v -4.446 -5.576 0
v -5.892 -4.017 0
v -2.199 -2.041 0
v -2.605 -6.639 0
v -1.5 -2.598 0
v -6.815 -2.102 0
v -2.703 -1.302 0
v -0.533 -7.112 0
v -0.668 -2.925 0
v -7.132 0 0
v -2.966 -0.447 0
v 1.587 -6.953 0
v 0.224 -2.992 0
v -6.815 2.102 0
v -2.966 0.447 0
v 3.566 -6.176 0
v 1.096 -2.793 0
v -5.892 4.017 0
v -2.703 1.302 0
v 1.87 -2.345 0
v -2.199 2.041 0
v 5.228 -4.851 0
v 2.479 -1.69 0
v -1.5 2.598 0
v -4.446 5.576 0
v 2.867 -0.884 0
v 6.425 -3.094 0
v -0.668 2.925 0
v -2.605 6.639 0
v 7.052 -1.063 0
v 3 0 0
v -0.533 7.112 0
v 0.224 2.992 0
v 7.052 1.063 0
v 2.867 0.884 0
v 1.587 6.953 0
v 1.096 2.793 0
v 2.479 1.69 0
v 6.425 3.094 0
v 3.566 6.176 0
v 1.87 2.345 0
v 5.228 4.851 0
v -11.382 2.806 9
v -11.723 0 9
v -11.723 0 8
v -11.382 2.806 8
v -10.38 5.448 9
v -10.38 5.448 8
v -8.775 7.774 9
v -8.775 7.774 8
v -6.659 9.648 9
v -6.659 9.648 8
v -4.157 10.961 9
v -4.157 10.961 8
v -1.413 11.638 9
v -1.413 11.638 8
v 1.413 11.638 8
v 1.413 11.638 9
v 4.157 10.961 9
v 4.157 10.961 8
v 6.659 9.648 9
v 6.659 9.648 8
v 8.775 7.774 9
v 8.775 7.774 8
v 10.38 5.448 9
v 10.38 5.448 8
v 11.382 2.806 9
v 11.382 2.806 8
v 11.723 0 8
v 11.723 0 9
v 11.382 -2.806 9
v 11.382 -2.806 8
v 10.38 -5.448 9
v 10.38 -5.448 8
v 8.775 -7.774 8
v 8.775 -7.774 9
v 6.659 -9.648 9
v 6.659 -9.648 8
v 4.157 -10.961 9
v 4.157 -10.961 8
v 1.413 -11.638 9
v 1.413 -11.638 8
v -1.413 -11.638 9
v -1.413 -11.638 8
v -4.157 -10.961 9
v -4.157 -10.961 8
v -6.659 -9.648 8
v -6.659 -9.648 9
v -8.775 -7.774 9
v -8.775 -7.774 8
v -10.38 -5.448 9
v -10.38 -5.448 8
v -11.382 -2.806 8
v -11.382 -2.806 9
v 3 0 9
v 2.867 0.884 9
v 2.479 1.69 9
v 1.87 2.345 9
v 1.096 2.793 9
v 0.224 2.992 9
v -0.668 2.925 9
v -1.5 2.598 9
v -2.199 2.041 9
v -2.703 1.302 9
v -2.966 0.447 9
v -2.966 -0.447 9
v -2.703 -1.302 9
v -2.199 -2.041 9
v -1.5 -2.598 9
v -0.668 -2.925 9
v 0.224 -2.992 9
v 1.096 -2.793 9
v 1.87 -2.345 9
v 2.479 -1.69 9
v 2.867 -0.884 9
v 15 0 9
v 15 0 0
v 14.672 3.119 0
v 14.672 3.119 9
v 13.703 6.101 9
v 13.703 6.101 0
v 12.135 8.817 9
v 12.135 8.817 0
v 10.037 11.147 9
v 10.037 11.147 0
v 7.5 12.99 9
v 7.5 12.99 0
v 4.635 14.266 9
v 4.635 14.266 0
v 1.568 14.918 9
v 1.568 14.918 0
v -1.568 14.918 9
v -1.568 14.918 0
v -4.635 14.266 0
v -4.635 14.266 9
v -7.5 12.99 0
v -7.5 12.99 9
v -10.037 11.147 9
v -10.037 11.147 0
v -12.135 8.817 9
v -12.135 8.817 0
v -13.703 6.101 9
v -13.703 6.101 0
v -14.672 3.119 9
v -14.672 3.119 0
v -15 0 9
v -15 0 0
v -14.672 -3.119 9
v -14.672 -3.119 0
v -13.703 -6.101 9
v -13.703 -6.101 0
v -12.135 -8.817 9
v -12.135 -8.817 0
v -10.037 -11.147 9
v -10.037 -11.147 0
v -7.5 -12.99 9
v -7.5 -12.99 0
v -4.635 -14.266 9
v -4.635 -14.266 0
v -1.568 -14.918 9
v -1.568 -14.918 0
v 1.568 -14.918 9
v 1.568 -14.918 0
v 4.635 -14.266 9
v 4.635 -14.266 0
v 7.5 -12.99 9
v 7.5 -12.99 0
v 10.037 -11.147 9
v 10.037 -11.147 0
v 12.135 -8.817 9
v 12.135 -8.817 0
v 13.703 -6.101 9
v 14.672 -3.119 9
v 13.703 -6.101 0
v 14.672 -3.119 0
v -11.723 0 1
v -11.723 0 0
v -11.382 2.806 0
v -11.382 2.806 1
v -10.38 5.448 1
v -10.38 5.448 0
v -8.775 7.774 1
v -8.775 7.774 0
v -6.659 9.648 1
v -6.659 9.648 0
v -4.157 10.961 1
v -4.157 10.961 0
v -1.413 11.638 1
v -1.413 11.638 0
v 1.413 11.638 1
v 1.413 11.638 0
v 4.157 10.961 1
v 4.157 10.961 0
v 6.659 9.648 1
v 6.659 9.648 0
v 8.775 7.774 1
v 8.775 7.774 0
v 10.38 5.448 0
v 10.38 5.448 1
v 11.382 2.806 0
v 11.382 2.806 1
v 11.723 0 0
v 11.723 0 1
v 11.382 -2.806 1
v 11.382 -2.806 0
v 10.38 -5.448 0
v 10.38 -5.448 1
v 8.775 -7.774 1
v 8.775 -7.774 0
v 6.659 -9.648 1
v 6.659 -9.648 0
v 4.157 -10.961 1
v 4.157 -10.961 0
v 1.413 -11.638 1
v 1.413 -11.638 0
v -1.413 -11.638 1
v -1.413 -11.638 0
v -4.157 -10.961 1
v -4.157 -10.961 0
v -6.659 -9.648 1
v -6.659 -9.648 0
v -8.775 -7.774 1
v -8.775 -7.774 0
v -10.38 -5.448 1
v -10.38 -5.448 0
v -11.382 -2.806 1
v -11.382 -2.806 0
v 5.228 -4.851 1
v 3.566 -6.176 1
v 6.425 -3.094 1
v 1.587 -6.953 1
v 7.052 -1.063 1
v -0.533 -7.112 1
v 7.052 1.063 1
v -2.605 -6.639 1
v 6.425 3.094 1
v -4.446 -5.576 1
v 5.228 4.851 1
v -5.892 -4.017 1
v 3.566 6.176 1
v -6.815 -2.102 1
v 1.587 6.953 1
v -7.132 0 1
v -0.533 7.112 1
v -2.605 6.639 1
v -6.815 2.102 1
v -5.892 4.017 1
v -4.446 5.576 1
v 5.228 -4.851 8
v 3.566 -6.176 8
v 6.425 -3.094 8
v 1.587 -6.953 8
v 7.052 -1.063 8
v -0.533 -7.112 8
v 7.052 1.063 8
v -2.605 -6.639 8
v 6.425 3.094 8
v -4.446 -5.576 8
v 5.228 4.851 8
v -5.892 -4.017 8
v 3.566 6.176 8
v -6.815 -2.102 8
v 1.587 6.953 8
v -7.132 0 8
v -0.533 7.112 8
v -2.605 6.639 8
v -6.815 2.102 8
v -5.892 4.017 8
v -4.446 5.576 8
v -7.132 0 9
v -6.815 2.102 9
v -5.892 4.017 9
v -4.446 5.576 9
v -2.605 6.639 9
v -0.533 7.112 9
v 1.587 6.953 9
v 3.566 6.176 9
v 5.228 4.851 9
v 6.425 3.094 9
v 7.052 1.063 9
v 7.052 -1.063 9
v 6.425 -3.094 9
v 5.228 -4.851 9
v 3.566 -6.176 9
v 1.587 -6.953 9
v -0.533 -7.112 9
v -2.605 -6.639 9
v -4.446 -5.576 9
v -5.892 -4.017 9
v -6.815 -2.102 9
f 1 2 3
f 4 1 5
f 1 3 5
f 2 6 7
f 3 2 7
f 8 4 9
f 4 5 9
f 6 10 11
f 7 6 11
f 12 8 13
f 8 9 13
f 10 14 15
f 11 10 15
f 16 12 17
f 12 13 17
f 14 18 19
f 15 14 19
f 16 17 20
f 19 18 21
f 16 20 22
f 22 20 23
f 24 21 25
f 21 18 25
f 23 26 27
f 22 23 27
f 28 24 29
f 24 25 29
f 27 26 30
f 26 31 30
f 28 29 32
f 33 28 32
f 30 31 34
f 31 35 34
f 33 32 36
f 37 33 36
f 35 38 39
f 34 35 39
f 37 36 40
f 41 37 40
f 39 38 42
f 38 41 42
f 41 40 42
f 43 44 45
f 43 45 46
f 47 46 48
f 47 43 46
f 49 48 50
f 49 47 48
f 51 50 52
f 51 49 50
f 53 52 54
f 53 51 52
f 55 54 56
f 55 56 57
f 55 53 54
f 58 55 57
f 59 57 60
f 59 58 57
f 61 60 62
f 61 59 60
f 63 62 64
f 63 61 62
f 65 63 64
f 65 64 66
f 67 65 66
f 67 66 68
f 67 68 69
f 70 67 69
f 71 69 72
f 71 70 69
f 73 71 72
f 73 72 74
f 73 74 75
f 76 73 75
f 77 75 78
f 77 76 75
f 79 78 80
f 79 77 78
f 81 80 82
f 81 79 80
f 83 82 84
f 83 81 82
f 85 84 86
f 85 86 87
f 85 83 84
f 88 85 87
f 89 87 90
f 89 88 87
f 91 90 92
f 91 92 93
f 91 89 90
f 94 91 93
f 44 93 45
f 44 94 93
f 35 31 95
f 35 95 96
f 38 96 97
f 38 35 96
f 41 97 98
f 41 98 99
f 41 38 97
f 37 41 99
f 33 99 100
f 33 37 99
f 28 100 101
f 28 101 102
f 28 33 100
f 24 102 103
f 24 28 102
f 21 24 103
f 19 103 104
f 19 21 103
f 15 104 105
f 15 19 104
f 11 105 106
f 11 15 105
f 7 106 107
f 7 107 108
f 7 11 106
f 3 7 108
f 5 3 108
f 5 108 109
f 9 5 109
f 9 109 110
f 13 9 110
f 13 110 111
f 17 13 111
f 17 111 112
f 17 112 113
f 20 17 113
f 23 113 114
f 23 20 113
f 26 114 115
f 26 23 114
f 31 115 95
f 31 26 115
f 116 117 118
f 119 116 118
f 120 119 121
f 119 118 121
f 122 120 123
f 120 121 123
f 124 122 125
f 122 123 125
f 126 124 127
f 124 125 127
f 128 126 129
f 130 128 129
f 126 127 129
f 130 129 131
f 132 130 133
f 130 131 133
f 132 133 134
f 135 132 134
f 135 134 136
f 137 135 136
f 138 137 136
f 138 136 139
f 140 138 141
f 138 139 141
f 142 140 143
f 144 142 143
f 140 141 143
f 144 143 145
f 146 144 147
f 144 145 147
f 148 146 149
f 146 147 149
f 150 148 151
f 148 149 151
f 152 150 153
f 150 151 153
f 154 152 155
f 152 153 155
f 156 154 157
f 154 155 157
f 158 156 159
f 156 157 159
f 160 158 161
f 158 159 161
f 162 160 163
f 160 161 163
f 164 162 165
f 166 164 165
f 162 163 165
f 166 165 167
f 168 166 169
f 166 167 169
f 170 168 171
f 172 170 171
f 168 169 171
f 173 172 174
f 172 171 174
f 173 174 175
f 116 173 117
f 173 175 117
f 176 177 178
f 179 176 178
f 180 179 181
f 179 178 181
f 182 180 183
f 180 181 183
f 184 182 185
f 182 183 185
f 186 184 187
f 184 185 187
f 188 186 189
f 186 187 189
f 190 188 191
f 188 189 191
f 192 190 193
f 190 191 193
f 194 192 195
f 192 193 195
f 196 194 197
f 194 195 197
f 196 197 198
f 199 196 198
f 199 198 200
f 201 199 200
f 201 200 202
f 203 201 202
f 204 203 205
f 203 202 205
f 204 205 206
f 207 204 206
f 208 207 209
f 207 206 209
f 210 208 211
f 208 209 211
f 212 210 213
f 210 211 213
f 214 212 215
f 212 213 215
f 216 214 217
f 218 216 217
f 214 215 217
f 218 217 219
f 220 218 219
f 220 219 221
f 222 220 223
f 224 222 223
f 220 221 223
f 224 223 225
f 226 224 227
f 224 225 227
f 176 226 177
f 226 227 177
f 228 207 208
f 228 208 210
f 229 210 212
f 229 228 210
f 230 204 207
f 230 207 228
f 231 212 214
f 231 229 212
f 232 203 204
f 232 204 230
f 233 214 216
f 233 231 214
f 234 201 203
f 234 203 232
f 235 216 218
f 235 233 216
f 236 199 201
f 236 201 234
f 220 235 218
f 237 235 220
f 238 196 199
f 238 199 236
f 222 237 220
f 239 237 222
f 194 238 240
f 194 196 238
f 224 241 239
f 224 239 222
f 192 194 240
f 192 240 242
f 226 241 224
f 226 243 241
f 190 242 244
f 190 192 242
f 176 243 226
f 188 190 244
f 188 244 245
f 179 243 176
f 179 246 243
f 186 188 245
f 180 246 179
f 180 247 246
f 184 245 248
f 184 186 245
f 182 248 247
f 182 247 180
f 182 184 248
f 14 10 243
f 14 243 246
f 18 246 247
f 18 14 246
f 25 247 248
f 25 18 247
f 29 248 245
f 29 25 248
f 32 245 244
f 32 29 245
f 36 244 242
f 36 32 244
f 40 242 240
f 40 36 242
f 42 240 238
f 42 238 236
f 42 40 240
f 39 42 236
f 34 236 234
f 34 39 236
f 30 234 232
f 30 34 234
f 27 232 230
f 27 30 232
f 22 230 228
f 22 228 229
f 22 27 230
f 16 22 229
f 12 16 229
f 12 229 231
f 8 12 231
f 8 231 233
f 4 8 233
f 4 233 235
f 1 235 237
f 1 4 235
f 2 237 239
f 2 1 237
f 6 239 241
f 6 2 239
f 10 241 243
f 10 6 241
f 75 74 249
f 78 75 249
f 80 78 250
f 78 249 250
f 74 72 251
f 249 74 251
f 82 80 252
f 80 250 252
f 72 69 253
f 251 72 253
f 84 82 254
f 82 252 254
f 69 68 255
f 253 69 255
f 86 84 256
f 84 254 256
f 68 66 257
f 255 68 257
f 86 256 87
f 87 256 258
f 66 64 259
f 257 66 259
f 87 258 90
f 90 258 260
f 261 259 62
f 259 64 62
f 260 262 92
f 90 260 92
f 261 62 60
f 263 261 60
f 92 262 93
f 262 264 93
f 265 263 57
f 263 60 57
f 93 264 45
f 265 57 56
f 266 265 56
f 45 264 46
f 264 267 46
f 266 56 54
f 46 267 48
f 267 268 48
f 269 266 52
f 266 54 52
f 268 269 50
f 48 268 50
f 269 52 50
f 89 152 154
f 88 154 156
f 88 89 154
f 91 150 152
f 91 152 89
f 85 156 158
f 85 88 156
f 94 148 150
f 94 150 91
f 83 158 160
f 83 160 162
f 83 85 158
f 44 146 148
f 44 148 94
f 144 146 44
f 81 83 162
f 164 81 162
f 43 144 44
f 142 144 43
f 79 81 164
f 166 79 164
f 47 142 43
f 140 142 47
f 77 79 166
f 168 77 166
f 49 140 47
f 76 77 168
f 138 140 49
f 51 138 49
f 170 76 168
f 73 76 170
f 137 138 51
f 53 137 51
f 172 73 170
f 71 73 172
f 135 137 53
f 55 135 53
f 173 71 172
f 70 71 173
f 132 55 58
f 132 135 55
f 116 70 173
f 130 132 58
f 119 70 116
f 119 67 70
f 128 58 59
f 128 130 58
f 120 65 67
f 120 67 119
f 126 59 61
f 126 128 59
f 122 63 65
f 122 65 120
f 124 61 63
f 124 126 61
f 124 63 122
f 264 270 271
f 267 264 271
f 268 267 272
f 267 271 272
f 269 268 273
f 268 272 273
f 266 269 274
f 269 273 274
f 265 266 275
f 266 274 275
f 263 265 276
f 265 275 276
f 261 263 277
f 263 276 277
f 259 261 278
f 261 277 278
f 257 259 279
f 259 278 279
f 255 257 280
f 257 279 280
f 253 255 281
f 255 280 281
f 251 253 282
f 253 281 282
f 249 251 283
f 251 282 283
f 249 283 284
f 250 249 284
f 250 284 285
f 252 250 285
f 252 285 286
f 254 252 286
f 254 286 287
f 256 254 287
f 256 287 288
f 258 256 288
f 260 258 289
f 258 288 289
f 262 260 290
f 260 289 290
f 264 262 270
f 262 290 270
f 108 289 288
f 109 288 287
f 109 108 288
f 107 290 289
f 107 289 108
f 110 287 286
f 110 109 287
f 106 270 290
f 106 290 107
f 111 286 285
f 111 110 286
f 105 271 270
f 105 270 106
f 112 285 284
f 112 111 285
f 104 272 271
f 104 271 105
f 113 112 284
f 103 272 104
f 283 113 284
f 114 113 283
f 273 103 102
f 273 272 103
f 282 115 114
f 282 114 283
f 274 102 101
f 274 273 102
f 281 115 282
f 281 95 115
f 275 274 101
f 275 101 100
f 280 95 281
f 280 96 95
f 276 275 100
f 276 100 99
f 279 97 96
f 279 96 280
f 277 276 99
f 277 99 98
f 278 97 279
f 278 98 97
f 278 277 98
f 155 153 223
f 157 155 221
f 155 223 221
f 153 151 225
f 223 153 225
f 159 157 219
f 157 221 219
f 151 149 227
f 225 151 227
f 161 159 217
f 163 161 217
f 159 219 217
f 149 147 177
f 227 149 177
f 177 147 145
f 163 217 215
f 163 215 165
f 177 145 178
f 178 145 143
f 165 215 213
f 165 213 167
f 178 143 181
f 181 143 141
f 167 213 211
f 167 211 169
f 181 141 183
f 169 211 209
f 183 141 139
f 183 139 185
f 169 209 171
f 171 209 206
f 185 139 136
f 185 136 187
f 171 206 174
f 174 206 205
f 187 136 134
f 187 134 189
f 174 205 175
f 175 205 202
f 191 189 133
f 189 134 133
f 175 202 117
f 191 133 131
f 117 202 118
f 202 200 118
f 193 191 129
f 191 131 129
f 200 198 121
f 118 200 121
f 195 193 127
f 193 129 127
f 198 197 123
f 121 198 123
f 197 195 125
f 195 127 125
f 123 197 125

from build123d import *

# Parameters (mm, degrees)
SKETCH_1_R          = 15
SKETCH_1_R_2        = 3
EXTRUDE_1_DEPTH     = 9
SKETCH_2_R          = 11.723129436
SKETCH_2_R_2        = 7.131561965
CUT_EXTRUDE_1_DEPTH = 1


with BuildPart() as part:
    # 草图1 → 凸台-拉伸1 (new body)
    with BuildSketch(Plane.XY):
        Circle(SKETCH_1_R)
        Circle(SKETCH_1_R_2, mode=Mode.SUBTRACT)
    extrude(amount=EXTRUDE_1_DEPTH)

    # 草图2 → 切除-拉伸1 (cut)
    with BuildSketch(Plane(origin=(0, 0, 0), x_dir=(-1, 0, 0), z_dir=(0, 0, -1))):
        Circle(SKETCH_2_R)
        Circle(SKETCH_2_R_2, mode=Mode.SUBTRACT)
    cut_extrude_1 = extrude(amount=-CUT_EXTRUDE_1_DEPTH, mode=Mode.SUBTRACT)

    # 镜向1: 切除-拉伸1 across plane
    add(cut_extrude_1.mirror(Plane(origin=(0, 0, 4.5), x_dir=(1, 0, 0), z_dir=(0, 0, -1))), mode=Mode.SUBTRACT)


solid = part.part
